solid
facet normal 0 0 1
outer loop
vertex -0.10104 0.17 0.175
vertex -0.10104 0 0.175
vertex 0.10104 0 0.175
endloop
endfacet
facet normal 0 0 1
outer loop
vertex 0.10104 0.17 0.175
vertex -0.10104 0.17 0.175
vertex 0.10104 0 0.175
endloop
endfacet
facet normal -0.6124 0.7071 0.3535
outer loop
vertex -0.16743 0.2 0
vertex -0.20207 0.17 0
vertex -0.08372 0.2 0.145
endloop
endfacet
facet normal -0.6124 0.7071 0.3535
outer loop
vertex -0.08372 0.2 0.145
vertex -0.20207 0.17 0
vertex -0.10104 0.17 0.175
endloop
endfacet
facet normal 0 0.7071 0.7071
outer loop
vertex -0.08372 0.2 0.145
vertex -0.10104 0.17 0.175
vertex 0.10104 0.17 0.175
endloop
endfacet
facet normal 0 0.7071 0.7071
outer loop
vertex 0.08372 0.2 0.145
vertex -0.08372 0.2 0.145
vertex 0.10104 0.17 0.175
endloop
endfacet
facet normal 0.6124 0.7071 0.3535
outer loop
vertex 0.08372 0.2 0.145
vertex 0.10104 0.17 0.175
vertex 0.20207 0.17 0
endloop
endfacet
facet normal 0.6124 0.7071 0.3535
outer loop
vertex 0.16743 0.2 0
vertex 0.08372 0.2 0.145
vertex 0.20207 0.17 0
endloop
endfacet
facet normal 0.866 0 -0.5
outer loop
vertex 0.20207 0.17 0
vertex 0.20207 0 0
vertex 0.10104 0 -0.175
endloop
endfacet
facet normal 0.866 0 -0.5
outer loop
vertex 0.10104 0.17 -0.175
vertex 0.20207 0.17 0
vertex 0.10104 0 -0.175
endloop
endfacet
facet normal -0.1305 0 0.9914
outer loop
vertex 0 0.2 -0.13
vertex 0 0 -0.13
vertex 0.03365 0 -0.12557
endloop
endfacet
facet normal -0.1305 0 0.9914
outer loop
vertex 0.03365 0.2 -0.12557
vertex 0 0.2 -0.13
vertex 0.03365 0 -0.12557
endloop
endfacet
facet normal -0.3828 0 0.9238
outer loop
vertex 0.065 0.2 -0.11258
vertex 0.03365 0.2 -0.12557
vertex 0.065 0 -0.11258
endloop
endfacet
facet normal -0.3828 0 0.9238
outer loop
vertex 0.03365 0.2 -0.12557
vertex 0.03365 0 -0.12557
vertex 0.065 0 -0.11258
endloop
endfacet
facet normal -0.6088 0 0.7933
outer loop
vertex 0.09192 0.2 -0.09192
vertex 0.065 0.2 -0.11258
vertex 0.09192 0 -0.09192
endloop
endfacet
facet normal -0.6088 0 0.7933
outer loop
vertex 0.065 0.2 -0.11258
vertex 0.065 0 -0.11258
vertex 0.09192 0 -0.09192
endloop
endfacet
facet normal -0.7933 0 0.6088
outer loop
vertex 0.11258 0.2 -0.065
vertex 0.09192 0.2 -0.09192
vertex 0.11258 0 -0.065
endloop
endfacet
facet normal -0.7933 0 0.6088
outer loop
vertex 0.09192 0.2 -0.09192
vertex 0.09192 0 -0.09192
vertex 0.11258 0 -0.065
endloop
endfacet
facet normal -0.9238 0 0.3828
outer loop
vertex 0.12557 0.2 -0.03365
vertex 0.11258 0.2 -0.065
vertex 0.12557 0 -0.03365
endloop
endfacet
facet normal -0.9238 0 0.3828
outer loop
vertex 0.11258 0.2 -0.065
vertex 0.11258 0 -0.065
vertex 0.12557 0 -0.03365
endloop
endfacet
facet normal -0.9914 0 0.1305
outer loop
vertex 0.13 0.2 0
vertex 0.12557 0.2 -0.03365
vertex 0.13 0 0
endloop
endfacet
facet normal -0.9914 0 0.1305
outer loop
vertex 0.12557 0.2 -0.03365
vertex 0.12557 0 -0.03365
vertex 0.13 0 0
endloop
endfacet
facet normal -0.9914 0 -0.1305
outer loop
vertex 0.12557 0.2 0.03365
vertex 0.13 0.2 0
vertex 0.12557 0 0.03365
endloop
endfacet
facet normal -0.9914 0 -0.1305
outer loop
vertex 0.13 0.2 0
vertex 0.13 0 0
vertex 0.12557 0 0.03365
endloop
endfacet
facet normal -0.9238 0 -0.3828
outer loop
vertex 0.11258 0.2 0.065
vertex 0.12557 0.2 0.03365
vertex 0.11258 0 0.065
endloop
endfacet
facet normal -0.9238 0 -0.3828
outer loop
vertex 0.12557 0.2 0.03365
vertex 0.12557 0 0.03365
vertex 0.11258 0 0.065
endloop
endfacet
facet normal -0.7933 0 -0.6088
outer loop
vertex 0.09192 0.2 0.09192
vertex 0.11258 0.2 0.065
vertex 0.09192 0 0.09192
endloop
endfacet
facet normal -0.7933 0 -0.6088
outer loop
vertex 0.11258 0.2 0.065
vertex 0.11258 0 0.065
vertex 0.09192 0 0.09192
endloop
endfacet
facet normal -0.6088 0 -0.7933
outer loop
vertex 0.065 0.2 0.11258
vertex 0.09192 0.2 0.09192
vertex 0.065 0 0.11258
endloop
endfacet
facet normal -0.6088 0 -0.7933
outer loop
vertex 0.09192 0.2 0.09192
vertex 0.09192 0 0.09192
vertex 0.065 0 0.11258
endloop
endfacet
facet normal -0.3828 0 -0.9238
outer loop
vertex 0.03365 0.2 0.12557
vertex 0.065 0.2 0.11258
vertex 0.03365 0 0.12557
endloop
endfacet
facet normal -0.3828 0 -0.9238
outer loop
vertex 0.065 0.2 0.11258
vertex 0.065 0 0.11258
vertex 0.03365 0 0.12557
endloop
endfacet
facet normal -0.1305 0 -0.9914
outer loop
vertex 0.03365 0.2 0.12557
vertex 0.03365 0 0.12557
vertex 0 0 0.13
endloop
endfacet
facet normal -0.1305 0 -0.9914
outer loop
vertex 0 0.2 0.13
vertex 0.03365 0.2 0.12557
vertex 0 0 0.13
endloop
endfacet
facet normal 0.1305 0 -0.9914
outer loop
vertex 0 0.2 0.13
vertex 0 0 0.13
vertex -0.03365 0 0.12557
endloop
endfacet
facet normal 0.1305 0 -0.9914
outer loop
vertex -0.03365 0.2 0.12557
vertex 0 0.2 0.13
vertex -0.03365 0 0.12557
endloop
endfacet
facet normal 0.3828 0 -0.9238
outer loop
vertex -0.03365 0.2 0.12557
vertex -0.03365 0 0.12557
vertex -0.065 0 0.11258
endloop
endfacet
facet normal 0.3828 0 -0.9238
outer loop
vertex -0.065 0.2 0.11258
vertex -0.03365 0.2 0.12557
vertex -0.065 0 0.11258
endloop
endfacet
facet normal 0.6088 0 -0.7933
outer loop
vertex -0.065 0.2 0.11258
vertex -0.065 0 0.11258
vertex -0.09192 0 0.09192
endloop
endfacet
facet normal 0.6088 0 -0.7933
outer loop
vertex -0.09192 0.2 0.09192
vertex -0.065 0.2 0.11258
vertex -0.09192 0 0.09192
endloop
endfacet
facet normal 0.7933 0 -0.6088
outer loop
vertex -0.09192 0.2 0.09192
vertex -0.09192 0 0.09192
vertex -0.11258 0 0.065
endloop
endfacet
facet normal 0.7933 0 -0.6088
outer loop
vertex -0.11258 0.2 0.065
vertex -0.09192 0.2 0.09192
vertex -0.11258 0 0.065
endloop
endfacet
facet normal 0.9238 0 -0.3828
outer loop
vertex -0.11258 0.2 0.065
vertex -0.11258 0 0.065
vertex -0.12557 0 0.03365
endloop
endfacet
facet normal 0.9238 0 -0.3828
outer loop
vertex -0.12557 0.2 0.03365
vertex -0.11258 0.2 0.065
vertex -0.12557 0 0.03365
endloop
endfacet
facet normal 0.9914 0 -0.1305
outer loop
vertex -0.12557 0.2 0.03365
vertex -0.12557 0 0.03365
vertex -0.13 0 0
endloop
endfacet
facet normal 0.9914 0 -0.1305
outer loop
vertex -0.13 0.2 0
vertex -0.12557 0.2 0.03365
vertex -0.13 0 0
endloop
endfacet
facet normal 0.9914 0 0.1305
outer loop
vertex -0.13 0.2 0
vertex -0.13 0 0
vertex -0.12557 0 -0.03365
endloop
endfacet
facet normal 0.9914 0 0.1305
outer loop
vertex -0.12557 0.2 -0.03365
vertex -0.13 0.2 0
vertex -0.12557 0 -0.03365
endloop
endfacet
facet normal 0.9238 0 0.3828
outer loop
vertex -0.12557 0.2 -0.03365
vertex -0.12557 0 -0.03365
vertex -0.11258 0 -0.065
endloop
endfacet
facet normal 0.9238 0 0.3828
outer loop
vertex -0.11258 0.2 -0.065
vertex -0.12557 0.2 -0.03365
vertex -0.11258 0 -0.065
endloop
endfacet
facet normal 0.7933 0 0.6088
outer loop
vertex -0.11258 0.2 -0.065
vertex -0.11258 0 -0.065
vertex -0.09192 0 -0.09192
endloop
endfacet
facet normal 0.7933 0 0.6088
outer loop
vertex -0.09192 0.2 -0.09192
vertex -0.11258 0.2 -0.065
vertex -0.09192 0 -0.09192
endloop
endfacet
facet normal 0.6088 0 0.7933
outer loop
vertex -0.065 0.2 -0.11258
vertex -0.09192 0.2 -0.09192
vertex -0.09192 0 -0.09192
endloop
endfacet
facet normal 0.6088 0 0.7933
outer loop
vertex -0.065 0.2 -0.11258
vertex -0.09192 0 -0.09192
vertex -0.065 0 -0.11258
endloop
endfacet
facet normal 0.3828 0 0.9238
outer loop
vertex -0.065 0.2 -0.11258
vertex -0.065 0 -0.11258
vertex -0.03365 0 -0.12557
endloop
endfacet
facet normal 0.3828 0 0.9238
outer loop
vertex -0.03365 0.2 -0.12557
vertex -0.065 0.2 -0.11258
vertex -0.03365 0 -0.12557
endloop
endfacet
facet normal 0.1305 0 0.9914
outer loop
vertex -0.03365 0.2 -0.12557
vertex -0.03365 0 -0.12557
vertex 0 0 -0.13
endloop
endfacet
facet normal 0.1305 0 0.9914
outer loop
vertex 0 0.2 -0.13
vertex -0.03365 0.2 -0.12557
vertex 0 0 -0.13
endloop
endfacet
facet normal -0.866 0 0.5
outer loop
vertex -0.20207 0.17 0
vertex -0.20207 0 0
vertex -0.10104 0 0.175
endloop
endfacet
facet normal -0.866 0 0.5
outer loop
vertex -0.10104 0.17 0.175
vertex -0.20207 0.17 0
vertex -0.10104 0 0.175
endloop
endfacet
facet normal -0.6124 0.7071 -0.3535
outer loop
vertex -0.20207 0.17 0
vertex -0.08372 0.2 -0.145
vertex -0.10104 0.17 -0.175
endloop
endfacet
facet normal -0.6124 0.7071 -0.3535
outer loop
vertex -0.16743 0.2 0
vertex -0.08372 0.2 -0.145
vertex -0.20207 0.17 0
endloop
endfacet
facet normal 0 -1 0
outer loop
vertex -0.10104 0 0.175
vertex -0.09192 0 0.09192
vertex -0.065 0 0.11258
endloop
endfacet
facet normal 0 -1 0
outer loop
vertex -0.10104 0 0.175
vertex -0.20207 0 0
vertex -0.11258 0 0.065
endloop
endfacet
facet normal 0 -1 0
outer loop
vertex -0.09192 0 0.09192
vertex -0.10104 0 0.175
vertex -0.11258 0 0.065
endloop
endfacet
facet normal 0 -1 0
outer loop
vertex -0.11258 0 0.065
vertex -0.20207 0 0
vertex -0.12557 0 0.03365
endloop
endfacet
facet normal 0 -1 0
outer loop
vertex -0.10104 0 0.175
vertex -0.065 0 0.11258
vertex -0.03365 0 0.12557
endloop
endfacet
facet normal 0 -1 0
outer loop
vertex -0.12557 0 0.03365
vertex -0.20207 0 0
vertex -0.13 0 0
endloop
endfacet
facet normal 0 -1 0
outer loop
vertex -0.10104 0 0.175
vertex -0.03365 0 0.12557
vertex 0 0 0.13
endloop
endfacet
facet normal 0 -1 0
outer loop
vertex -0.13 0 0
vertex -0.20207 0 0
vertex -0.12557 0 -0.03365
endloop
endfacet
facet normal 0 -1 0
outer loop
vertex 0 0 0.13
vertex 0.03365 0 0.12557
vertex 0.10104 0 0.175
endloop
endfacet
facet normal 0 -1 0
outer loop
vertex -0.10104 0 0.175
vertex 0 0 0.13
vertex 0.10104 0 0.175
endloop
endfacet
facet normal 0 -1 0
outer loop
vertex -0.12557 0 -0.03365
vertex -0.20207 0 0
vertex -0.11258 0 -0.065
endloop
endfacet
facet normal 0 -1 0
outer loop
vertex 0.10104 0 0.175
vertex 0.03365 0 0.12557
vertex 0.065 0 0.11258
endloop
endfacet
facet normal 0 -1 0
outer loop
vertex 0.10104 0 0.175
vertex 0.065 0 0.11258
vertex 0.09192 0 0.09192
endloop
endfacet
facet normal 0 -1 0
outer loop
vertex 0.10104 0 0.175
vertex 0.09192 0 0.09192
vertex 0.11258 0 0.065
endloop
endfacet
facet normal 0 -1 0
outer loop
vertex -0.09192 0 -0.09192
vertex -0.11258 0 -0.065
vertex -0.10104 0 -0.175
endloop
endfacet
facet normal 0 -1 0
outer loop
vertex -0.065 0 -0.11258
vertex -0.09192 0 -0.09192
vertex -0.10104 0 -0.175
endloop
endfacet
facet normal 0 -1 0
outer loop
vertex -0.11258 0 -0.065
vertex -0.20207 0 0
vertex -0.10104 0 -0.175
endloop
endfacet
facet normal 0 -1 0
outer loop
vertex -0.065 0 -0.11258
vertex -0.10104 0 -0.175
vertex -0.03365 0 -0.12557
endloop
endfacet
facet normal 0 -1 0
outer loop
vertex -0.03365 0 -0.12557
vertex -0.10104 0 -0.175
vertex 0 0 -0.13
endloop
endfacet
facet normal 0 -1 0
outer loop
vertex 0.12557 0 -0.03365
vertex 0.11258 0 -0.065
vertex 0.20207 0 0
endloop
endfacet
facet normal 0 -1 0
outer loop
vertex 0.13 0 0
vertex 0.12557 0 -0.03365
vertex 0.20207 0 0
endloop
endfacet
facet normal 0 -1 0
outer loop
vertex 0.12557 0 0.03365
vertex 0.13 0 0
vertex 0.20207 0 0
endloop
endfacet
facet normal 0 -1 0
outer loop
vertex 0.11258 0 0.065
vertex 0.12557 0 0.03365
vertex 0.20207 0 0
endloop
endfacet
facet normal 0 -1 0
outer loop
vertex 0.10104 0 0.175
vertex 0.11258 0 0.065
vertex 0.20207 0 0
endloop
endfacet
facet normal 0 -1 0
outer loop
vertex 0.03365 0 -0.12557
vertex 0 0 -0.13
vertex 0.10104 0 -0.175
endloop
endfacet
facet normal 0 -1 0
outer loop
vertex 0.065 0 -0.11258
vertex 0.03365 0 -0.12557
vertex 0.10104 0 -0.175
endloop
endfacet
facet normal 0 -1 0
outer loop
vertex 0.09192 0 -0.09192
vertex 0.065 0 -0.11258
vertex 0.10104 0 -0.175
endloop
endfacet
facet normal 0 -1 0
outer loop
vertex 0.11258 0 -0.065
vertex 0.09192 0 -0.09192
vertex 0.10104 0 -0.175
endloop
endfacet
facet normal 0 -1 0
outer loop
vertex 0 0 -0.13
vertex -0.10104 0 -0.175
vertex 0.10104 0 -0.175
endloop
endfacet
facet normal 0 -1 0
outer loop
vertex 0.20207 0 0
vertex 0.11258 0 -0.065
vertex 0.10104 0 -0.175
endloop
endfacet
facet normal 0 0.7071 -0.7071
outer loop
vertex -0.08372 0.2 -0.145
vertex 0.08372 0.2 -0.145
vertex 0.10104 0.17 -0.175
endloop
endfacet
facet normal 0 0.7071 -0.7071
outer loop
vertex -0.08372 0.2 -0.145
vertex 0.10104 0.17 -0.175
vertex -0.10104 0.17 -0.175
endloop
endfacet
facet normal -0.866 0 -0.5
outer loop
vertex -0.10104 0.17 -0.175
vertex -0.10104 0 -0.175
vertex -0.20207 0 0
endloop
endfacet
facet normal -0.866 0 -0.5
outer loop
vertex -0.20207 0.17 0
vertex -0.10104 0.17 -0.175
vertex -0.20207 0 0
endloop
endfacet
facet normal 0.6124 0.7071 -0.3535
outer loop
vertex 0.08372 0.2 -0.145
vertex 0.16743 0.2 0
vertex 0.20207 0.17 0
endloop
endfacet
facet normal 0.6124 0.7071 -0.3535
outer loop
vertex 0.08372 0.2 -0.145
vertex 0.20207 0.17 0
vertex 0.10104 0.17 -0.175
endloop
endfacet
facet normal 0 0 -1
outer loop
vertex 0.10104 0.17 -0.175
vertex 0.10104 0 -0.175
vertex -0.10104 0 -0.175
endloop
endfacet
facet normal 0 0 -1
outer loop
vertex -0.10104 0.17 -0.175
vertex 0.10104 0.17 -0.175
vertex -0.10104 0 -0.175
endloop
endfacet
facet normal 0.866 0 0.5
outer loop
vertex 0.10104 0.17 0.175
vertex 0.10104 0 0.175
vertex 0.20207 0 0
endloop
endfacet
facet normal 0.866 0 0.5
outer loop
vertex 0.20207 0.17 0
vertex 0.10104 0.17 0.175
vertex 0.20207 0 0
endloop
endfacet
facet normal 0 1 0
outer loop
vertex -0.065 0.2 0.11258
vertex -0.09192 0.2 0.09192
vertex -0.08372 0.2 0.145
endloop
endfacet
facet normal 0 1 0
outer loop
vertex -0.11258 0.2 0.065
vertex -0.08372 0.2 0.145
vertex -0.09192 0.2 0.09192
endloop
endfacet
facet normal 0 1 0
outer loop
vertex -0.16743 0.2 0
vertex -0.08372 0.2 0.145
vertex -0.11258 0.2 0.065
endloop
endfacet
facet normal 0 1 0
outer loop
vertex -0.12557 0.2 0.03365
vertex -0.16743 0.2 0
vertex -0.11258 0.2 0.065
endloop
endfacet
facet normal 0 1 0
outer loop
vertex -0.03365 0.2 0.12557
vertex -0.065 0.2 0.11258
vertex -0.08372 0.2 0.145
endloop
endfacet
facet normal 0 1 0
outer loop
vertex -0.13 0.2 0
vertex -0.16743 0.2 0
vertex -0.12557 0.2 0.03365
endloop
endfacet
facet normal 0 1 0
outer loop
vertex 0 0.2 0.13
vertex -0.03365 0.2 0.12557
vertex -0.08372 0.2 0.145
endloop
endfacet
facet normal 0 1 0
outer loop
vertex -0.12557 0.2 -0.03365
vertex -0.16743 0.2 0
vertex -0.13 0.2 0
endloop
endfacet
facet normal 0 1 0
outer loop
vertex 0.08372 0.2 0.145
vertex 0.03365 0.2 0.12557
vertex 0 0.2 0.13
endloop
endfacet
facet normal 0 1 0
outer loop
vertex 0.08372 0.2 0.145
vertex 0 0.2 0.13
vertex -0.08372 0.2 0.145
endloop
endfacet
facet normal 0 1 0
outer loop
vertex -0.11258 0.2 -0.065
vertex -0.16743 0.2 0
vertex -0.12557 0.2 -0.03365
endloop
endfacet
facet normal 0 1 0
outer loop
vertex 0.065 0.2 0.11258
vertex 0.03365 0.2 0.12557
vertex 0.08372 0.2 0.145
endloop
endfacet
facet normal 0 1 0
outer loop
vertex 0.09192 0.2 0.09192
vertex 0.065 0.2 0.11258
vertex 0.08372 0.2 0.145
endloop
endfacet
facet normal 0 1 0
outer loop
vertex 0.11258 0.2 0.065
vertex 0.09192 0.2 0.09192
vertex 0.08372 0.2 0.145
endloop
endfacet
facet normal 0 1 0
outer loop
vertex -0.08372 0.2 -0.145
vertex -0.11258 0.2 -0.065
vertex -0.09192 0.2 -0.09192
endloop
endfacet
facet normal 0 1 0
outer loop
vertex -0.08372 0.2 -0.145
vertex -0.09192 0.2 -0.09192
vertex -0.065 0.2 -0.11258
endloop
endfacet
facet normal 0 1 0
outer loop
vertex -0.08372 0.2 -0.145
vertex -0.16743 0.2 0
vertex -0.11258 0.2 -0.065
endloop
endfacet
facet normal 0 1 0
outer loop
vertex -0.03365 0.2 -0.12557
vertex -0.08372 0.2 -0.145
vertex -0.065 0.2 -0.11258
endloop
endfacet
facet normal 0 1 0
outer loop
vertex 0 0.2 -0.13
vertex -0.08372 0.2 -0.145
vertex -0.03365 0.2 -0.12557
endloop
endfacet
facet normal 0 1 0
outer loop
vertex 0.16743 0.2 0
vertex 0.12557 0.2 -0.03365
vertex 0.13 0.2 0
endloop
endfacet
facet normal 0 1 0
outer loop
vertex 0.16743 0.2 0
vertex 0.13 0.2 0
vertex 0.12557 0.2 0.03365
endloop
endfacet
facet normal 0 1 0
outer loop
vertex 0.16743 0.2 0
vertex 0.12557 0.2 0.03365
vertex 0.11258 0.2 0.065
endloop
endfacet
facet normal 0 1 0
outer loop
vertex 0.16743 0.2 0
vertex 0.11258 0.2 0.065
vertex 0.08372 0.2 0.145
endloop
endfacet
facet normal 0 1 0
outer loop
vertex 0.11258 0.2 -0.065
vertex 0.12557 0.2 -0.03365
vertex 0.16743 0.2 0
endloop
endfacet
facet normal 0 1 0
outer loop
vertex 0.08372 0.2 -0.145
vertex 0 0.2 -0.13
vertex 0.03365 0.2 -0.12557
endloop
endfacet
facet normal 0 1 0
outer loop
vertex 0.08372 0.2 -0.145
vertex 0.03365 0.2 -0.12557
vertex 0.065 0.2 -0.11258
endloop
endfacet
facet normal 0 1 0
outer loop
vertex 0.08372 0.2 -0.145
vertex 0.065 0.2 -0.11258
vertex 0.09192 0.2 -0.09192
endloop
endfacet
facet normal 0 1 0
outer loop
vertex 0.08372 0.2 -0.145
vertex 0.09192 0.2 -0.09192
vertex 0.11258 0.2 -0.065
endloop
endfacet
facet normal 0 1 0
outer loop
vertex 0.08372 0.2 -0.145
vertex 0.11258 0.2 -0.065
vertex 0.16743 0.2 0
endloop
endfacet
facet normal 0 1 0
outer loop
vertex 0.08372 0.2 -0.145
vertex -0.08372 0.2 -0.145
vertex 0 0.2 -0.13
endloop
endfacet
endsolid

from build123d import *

# Parameters (mm, degrees)
BOSS_EXTRUDE1_DEPTH = 0.2
CUT_EXTRUDE1_REACH  = 2.334
SKETCH3_R           = 0.13
CHAMFER2_SIZE       = 0.03


with BuildPart() as part:
    # Sketch1 → Boss-Extrude1 (new body)
    with BuildSketch(Plane(origin=(0, 0, 0), x_dir=(1, 0, 0), z_dir=(0, 1, 0))):
        Polygon((0.101036297, 0.175), (-0.101036297, 0.175), (-0.202072594, 0), (-0.101036297, -0.175), (0.101036297, -0.175), (0.202072594, 0), align=None)
    extrude(amount=BOSS_EXTRUDE1_DEPTH)

    # Sketch3 → Cut-Extrude1 (cut, up to next)
    with BuildSketch(Plane.XZ, mode=Mode.PRIVATE) as cut_extrude1_sk1:
        with Locations(Location((0, 0, 0), (0, 0, 270))):
            Circle(SKETCH3_R)
    cut_extrude1_tool1 = extrude(cut_extrude1_sk1.sketch, amount=-CUT_EXTRUDE1_REACH, mode=Mode.PRIVATE) & part.part
    add(cut_extrude1_tool1.solids().sort_by_distance((0, 0, 0))[0], mode=Mode.SUBTRACT)

    # Chamfer2
    chamfer2_edges = [part.edges().sort_by_distance(p)[0] for p in [
        (-0.151554446, 0.2, -0.0875),
        (-0.151554446, 0.2, 0.0875),
        (0, 0.2, 0.175),
        (0.151554446, 0.2, 0.0875),
        (0.151554446, 0.2, -0.0875),
        (0, 0.2, -0.175),
    ]]
    chamfer(chamfer2_edges, length=CHAMFER2_SIZE)


solid = part.part
